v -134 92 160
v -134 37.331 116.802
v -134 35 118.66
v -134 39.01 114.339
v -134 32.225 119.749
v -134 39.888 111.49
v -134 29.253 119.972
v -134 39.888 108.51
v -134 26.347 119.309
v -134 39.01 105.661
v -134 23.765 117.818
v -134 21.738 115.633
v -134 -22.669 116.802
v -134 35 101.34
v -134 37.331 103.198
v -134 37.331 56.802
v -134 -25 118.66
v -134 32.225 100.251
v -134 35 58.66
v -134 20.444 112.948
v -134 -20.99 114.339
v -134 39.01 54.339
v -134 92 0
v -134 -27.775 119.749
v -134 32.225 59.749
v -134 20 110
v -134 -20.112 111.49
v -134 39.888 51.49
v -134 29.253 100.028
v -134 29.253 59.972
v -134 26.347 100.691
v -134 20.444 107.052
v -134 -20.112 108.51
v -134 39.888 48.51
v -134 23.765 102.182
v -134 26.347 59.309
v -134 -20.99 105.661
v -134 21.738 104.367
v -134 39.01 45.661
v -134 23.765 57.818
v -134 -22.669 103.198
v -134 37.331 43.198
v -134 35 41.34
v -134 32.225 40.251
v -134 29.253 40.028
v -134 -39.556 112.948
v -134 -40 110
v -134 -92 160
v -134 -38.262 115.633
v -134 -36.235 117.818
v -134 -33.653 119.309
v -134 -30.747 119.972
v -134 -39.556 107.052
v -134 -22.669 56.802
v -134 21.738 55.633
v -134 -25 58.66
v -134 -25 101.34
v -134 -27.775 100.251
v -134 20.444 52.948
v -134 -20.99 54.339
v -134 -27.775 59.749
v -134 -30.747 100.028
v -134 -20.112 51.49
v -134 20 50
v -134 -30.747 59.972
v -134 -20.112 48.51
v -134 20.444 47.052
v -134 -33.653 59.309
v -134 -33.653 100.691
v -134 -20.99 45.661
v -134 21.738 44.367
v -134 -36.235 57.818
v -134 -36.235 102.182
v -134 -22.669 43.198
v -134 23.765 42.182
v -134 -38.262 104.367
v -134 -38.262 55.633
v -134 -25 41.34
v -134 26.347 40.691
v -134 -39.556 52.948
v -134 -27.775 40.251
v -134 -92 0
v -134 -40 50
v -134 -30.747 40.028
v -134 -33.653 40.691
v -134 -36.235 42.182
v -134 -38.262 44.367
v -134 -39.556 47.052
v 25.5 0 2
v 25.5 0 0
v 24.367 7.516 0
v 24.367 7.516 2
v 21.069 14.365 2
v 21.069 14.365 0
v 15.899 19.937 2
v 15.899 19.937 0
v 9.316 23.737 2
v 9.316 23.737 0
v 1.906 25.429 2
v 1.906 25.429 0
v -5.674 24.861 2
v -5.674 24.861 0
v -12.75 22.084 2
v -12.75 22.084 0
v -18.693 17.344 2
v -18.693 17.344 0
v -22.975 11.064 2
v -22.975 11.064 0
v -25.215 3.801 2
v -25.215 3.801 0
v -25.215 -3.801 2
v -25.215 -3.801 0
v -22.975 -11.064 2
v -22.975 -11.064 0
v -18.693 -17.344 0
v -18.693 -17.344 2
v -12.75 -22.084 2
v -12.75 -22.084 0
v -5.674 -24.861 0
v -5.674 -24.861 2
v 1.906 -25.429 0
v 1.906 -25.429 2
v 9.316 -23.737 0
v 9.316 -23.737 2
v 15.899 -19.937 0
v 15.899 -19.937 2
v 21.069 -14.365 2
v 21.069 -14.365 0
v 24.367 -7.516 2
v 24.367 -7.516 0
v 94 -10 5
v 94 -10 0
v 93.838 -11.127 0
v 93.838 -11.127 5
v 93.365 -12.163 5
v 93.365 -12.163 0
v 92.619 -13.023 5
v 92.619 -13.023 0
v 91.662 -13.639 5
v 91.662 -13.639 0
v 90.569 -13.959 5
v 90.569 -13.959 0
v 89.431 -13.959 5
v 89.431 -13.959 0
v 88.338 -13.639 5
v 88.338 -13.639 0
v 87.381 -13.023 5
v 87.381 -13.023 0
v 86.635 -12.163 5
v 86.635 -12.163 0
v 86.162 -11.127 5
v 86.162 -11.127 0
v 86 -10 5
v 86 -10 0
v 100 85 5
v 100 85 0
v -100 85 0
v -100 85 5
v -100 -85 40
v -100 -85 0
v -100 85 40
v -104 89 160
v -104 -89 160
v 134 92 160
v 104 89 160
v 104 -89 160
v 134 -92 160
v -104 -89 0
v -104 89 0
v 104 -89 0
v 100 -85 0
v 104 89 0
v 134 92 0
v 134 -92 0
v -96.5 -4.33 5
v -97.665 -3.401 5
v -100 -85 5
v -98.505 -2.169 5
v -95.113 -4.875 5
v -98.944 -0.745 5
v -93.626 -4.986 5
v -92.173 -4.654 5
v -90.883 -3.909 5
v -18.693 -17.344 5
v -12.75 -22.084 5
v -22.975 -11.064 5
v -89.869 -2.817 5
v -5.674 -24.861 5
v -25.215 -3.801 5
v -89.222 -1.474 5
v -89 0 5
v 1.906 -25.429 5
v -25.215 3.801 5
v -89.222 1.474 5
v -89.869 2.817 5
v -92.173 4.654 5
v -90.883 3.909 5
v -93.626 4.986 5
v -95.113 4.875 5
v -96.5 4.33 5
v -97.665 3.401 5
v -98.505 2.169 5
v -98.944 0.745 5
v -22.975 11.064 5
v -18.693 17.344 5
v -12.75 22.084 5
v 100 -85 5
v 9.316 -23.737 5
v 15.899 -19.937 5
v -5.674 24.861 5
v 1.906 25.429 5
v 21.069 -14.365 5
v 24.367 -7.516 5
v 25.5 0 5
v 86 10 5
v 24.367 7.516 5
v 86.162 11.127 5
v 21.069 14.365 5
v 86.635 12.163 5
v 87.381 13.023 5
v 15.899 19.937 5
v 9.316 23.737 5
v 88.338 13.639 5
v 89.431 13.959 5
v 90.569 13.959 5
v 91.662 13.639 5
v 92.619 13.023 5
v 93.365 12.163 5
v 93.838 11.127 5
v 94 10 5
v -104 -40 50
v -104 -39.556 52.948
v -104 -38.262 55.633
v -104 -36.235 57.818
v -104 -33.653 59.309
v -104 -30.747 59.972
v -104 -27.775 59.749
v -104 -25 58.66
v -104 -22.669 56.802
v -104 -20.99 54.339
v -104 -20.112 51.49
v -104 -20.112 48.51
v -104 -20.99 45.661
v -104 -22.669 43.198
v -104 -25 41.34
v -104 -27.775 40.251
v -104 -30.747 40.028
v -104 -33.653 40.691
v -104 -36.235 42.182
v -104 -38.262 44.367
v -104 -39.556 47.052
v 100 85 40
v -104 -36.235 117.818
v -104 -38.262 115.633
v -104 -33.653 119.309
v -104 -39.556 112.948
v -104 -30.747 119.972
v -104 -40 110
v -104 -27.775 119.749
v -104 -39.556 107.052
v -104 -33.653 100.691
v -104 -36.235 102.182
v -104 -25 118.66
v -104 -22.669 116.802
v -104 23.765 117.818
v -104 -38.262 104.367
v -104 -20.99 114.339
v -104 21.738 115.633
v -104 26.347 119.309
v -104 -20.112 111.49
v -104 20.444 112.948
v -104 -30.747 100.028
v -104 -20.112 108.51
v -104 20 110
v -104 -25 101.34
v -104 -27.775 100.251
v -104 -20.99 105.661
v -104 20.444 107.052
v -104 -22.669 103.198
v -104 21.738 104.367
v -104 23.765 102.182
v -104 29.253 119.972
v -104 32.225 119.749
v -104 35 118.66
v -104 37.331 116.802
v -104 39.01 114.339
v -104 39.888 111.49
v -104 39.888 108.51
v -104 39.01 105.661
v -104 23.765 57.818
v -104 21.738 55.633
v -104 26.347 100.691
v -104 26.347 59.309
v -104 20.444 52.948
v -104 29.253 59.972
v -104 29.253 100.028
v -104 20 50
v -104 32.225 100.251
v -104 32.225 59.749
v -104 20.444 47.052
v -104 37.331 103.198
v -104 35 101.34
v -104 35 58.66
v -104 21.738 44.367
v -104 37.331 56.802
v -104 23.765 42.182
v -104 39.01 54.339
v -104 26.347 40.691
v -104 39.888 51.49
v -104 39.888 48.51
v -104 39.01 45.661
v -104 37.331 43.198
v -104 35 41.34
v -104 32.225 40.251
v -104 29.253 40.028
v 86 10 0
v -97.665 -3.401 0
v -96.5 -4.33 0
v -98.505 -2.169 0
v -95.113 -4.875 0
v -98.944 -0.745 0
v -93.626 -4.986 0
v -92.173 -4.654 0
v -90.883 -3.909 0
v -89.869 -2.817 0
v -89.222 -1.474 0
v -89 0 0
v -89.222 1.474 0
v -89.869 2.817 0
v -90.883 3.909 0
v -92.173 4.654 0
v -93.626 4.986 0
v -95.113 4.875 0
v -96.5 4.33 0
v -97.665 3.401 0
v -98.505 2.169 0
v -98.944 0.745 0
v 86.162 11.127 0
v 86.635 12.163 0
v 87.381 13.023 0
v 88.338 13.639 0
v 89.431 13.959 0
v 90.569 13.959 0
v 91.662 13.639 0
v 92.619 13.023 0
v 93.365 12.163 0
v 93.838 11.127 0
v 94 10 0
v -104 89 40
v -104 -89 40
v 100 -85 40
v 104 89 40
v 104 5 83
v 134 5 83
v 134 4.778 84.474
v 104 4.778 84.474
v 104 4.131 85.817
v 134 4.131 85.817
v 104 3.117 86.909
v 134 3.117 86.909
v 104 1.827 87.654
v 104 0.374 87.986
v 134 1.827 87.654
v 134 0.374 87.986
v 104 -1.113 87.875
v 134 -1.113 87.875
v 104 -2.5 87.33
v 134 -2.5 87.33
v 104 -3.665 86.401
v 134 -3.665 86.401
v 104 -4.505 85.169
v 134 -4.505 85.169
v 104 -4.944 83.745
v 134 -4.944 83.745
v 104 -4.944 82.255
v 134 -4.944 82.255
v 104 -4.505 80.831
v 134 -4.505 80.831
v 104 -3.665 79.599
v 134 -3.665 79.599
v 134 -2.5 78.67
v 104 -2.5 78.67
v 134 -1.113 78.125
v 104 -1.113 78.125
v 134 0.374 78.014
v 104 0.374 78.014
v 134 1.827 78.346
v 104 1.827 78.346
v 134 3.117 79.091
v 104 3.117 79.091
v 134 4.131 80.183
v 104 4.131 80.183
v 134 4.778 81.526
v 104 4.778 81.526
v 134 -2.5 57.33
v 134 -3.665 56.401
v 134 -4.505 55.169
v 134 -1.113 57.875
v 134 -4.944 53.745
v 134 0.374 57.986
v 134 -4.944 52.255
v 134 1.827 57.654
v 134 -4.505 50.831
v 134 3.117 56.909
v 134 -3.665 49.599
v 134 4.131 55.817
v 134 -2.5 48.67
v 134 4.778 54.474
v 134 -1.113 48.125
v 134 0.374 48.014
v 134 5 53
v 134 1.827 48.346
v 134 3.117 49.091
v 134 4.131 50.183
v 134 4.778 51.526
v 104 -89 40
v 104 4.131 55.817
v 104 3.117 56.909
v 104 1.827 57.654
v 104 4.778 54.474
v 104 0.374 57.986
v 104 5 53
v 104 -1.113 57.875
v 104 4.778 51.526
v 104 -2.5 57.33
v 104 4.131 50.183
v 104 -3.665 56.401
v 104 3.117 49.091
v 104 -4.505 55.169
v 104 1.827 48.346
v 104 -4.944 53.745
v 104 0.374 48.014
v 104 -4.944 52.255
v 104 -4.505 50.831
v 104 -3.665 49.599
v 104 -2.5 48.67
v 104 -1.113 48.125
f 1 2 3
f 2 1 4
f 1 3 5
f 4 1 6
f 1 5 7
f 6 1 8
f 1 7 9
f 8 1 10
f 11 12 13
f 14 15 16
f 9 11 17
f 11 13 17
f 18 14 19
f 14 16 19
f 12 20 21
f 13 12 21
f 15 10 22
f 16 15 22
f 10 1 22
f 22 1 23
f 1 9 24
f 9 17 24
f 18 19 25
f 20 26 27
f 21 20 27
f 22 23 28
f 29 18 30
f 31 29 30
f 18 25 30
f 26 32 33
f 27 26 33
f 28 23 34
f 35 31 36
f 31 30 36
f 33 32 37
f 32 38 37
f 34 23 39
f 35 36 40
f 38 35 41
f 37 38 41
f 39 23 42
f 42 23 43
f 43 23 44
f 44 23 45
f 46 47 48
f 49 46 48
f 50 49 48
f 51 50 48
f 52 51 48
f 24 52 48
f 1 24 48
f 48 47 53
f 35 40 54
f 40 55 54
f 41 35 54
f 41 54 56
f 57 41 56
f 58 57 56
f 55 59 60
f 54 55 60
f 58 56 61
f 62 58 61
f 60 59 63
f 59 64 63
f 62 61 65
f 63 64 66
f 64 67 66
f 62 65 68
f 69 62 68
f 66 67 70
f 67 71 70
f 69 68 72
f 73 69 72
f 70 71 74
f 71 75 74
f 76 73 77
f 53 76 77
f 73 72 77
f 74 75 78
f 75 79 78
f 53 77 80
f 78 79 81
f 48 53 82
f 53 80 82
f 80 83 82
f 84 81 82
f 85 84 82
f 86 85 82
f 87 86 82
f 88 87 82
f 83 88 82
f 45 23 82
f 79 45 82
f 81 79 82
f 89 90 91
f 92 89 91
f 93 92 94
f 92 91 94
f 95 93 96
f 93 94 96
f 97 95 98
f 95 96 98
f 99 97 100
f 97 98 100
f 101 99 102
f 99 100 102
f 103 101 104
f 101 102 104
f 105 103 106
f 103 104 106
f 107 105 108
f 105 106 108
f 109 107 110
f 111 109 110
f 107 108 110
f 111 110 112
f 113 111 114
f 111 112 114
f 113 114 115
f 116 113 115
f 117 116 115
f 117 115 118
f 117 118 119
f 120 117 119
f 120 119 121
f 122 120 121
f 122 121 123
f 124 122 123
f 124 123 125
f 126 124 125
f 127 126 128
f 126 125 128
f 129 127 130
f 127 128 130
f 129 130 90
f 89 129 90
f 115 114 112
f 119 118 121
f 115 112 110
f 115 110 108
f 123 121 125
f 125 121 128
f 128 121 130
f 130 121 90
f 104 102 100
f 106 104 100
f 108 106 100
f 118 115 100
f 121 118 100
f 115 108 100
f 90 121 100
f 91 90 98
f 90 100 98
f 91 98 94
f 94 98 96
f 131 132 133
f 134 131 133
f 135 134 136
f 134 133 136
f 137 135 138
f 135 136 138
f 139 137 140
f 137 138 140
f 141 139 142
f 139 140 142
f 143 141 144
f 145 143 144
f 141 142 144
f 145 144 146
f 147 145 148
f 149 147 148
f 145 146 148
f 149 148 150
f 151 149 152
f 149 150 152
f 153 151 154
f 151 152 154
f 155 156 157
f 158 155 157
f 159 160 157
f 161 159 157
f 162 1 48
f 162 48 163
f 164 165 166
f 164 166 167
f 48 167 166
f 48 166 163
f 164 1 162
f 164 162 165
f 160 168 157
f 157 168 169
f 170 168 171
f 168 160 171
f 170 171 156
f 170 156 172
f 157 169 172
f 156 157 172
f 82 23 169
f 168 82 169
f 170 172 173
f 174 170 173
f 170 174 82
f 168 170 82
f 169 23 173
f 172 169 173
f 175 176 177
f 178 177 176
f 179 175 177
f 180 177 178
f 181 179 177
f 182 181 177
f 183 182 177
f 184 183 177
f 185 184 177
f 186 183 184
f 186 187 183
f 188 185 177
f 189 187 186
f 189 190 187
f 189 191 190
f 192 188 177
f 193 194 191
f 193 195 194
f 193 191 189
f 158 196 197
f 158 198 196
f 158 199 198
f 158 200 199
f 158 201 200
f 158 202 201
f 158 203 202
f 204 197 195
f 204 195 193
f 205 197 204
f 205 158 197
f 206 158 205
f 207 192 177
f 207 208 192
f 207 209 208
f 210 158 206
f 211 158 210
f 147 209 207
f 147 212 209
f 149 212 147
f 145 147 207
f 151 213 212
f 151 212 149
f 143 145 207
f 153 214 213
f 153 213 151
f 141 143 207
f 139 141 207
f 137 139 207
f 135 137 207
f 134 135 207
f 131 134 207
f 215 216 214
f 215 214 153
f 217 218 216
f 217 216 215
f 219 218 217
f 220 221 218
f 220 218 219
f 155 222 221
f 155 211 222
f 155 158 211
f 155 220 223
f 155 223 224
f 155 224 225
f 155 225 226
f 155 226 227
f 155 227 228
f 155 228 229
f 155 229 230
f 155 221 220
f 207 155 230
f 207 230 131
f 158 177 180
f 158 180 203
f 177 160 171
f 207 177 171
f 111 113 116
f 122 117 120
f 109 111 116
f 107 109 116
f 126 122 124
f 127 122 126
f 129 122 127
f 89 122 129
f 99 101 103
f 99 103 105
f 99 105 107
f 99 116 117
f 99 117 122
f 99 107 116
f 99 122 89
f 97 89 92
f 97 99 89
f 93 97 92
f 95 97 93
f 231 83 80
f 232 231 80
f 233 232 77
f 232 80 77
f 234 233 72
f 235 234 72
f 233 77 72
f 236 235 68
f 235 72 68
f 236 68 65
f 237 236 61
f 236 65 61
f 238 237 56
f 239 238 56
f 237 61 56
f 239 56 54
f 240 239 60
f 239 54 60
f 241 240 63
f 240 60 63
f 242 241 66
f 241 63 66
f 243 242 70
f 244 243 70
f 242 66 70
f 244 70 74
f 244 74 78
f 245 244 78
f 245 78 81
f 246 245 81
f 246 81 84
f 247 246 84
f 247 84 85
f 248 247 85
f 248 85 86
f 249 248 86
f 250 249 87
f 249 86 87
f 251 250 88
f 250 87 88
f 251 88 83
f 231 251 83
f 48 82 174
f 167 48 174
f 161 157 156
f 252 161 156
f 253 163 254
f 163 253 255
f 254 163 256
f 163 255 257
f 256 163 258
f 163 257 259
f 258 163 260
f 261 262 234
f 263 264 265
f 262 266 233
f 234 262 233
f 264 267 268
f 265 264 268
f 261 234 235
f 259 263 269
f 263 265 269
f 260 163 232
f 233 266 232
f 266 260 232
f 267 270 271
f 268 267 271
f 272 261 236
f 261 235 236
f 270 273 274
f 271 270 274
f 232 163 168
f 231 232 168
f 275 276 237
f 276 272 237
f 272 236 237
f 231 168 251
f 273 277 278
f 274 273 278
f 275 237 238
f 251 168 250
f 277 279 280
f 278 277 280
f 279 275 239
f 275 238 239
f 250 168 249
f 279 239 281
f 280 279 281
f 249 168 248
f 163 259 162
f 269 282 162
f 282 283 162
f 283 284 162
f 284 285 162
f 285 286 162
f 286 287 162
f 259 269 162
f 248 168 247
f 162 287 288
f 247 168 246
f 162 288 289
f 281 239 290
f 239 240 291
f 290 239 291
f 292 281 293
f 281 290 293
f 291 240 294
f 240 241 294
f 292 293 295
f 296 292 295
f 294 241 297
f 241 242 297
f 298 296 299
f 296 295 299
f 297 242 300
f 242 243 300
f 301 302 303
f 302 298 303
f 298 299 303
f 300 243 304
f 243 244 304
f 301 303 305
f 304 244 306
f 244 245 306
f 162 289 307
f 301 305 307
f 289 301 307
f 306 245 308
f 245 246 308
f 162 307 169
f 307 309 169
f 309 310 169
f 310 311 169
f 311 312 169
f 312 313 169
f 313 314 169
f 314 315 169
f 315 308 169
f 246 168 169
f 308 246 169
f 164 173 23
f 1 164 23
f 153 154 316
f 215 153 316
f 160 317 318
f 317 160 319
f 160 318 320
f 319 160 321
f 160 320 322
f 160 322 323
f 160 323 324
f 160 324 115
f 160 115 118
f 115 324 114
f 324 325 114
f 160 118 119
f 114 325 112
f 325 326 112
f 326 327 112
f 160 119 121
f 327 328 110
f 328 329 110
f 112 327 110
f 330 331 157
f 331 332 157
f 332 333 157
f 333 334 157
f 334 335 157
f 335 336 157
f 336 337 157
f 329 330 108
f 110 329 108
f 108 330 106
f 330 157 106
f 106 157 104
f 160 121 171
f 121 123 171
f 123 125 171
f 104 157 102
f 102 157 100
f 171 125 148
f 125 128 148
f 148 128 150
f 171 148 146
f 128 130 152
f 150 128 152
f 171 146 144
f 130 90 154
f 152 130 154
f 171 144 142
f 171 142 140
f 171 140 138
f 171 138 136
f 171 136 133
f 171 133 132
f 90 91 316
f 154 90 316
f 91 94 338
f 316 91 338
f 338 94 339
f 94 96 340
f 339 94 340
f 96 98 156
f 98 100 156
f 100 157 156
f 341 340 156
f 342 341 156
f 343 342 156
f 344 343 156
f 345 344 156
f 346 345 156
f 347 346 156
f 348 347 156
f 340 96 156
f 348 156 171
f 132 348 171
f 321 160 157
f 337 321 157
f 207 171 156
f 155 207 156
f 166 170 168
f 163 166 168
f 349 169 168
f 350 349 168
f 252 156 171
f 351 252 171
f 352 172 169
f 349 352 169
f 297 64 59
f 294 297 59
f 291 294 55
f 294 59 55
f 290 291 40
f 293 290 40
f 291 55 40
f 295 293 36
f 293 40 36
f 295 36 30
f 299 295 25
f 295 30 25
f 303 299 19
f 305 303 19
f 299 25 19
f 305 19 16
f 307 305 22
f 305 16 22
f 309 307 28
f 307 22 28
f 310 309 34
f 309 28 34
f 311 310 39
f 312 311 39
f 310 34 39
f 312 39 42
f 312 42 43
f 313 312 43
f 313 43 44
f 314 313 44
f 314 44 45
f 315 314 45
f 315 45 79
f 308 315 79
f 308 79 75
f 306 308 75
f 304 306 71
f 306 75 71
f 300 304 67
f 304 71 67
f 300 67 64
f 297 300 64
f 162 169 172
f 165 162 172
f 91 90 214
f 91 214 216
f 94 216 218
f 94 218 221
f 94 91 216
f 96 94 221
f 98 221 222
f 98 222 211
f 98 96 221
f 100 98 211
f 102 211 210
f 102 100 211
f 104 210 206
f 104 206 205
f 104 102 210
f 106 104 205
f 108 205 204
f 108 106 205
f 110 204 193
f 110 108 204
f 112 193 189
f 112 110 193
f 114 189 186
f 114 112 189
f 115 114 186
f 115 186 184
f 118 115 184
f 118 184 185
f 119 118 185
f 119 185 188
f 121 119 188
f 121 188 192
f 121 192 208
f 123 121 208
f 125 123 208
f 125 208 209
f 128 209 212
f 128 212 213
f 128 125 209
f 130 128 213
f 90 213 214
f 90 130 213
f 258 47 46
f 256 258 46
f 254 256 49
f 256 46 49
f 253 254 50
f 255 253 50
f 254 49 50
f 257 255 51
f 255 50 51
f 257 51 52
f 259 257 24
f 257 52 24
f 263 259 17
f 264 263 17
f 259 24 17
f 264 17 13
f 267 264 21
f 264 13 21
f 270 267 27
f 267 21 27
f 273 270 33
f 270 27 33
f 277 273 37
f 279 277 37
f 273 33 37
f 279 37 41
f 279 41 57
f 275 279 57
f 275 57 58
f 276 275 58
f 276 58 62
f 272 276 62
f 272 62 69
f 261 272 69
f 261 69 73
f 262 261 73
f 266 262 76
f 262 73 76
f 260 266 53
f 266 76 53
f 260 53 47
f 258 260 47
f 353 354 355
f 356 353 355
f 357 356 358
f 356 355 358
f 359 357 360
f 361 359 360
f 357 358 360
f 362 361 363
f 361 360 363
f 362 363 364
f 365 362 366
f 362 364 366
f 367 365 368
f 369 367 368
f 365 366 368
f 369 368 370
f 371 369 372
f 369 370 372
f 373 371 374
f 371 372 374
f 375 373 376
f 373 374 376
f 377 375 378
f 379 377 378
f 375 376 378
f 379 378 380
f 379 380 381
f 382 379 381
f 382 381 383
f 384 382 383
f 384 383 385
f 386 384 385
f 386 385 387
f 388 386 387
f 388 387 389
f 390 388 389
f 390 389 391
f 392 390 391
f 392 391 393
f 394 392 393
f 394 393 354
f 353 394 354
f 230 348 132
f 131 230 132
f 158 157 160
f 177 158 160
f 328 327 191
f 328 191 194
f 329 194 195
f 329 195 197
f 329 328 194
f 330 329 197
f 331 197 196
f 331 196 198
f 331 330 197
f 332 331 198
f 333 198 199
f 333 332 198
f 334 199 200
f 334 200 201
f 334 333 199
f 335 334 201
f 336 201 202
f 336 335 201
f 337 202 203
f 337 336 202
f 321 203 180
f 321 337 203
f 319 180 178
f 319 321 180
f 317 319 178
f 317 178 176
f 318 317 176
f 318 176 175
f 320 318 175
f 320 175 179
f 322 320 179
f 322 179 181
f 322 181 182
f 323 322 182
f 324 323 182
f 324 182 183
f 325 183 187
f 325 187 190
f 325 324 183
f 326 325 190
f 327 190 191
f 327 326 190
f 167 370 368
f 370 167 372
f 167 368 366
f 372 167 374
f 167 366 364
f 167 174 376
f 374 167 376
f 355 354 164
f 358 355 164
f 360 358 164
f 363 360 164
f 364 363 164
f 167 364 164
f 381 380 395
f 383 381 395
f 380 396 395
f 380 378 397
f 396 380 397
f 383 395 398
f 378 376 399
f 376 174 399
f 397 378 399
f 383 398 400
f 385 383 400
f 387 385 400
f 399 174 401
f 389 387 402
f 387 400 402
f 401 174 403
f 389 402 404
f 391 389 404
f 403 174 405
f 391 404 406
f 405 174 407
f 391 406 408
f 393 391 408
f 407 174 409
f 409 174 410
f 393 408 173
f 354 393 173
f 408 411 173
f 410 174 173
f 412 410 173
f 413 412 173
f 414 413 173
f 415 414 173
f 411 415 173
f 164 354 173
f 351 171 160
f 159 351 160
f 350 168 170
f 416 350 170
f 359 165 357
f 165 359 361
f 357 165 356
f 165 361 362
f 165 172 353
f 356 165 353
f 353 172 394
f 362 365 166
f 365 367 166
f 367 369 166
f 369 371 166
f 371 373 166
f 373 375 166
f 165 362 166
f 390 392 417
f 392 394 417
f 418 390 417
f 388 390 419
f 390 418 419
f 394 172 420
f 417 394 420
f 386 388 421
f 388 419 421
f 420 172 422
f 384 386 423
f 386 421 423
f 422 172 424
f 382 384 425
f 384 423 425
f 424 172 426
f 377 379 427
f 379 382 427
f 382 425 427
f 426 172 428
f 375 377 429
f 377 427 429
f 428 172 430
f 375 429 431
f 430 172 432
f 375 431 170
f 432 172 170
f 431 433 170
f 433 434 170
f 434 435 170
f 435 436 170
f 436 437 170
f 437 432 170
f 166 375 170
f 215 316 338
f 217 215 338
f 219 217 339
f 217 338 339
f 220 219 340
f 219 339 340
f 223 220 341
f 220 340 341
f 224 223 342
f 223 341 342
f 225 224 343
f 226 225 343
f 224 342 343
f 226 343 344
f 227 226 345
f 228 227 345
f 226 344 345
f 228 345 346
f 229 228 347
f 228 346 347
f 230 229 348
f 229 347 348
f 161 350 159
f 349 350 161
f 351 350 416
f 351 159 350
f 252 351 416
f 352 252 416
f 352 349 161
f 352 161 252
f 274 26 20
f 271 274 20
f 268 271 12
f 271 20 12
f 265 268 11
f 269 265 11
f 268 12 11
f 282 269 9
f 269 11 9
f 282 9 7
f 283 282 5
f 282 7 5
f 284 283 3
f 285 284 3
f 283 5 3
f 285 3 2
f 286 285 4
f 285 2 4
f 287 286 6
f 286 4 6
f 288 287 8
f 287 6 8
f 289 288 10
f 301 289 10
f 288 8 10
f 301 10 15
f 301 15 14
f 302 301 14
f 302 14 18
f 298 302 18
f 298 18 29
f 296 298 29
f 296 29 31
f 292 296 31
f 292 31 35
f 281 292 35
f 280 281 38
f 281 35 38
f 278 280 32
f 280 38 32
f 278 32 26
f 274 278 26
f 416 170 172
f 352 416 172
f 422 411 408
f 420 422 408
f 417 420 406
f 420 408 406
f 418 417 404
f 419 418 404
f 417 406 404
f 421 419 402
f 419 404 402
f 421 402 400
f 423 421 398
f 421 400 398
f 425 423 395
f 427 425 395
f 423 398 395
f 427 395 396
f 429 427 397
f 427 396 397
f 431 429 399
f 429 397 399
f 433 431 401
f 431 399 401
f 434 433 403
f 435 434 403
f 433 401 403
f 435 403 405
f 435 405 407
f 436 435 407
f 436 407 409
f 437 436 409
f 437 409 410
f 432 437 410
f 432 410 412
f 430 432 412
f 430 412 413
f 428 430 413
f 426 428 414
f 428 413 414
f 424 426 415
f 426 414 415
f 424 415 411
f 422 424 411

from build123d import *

# Parameters (mm, degrees)
F0_R      = 25.5
F1_DEPTH  = 2
F0_R_2    = 5
F2_DEPTH  = 5
F3_DEPTH  = 160
F4_DEPTH  = 40
F5_R      = 5
F6_DEPTH  = 30.3
F7_DEPTH  = 30
F8_DEPTH  = 10
F9_R      = 10
F10_DEPTH = 30


# Not quite as in the source:
# - a feature names something its author has since deleted; it is built from what else it names


with BuildPart() as f1:
    # F0 (on Top) → F1 (new body)
    with BuildSketch(Plane.XY):
        Circle(F0_R)
    extrude(amount=F1_DEPTH)

    # F0 (on Top) → F8 (cut)
    with BuildSketch(Plane.XY):
        with BuildLine():
            Line((94, -10), (94, 0))
            Line((94, 0), (94, 10))
            ThreePointArc((94, 10), (90, 14), (86, 10))
            Line((86, 10), (86, -10))
            ThreePointArc((86, -10), (90, -14), (94, -10))
        make_face()
    extrude(amount=F8_DEPTH, mode=Mode.SUBTRACT)


with BuildPart() as f2:
    # F0 (on Top) → F2 (new body)
    with BuildSketch(Plane.XY):
        Polygon((100, -85), (100, 0), (100, 85), (-100, 85), (-100, -85), align=None)
        with Locations((-94, 0)):
            Circle(F0_R_2, mode=Mode.SUBTRACT)
        Circle(F0_R, mode=Mode.SUBTRACT)
        with BuildLine():
            Line((94, 10), (94, 0))
            Line((94, 0), (94, -10))
            ThreePointArc((94, -10), (90, -14), (86, -10))
            Line((86, -10), (86, 10))
            ThreePointArc((86, 10), (90, 14), (94, 10))
        make_face(mode=Mode.SUBTRACT)
    extrude(amount=F2_DEPTH)


with BuildPart() as f3:
    # F0 (on Top) → F3 (new body)
    with BuildSketch(Plane.XY):
        Polygon((-134, -92), (134, -92), (134, 0), (134, 92), (-134, 92), align=None)
        Polygon((104, 89), (104, 0), (104, -89), (-104, -89), (-104, 89), align=None, mode=Mode.SUBTRACT)
    extrude(amount=F3_DEPTH)

    # F5 (on face) → F6 (cut)
    with BuildSketch(Plane.YZ.offset(134)):
        with Locations((0, 83)):
            Circle(F5_R)
    extrude(amount=-F6_DEPTH, mode=Mode.SUBTRACT)

    # F5 (on face) → F7 (cut)
    with BuildSketch(Plane.YZ.offset(134)):
        with Locations((0, 53)):
            Circle(F5_R)
    extrude(amount=-F7_DEPTH, mode=Mode.SUBTRACT)

    # F9 (on face) → F10 (cut, through all)
    with BuildSketch(Plane(origin=(-134, 0, 0), x_dir=(0, -1, 0), z_dir=(-1, 0, 0))):
        with Locations((-30, 110)):
            Circle(F9_R)
        with Locations((30, 110)):
            Circle(F9_R)
        with Locations((-30, 50)):
            Circle(F9_R)
        with Locations((30, 50)):
            Circle(F9_R)
    extrude(amount=-F10_DEPTH, mode=Mode.SUBTRACT)


with BuildPart() as f4:
    # F0 (on Top) → F4 (new body)
    with BuildSketch(Plane.XY):
        Polygon((104, -89), (104, 0), (104, 89), (-104, 89), (-104, -89), align=None)
        Polygon((100, 85), (100, 0), (100, -85), (-100, -85), (-100, 85), align=None, mode=Mode.SUBTRACT)
    extrude(amount=F4_DEPTH)


solid = Compound([f1.part, f2.part, f3.part, f4.part])
